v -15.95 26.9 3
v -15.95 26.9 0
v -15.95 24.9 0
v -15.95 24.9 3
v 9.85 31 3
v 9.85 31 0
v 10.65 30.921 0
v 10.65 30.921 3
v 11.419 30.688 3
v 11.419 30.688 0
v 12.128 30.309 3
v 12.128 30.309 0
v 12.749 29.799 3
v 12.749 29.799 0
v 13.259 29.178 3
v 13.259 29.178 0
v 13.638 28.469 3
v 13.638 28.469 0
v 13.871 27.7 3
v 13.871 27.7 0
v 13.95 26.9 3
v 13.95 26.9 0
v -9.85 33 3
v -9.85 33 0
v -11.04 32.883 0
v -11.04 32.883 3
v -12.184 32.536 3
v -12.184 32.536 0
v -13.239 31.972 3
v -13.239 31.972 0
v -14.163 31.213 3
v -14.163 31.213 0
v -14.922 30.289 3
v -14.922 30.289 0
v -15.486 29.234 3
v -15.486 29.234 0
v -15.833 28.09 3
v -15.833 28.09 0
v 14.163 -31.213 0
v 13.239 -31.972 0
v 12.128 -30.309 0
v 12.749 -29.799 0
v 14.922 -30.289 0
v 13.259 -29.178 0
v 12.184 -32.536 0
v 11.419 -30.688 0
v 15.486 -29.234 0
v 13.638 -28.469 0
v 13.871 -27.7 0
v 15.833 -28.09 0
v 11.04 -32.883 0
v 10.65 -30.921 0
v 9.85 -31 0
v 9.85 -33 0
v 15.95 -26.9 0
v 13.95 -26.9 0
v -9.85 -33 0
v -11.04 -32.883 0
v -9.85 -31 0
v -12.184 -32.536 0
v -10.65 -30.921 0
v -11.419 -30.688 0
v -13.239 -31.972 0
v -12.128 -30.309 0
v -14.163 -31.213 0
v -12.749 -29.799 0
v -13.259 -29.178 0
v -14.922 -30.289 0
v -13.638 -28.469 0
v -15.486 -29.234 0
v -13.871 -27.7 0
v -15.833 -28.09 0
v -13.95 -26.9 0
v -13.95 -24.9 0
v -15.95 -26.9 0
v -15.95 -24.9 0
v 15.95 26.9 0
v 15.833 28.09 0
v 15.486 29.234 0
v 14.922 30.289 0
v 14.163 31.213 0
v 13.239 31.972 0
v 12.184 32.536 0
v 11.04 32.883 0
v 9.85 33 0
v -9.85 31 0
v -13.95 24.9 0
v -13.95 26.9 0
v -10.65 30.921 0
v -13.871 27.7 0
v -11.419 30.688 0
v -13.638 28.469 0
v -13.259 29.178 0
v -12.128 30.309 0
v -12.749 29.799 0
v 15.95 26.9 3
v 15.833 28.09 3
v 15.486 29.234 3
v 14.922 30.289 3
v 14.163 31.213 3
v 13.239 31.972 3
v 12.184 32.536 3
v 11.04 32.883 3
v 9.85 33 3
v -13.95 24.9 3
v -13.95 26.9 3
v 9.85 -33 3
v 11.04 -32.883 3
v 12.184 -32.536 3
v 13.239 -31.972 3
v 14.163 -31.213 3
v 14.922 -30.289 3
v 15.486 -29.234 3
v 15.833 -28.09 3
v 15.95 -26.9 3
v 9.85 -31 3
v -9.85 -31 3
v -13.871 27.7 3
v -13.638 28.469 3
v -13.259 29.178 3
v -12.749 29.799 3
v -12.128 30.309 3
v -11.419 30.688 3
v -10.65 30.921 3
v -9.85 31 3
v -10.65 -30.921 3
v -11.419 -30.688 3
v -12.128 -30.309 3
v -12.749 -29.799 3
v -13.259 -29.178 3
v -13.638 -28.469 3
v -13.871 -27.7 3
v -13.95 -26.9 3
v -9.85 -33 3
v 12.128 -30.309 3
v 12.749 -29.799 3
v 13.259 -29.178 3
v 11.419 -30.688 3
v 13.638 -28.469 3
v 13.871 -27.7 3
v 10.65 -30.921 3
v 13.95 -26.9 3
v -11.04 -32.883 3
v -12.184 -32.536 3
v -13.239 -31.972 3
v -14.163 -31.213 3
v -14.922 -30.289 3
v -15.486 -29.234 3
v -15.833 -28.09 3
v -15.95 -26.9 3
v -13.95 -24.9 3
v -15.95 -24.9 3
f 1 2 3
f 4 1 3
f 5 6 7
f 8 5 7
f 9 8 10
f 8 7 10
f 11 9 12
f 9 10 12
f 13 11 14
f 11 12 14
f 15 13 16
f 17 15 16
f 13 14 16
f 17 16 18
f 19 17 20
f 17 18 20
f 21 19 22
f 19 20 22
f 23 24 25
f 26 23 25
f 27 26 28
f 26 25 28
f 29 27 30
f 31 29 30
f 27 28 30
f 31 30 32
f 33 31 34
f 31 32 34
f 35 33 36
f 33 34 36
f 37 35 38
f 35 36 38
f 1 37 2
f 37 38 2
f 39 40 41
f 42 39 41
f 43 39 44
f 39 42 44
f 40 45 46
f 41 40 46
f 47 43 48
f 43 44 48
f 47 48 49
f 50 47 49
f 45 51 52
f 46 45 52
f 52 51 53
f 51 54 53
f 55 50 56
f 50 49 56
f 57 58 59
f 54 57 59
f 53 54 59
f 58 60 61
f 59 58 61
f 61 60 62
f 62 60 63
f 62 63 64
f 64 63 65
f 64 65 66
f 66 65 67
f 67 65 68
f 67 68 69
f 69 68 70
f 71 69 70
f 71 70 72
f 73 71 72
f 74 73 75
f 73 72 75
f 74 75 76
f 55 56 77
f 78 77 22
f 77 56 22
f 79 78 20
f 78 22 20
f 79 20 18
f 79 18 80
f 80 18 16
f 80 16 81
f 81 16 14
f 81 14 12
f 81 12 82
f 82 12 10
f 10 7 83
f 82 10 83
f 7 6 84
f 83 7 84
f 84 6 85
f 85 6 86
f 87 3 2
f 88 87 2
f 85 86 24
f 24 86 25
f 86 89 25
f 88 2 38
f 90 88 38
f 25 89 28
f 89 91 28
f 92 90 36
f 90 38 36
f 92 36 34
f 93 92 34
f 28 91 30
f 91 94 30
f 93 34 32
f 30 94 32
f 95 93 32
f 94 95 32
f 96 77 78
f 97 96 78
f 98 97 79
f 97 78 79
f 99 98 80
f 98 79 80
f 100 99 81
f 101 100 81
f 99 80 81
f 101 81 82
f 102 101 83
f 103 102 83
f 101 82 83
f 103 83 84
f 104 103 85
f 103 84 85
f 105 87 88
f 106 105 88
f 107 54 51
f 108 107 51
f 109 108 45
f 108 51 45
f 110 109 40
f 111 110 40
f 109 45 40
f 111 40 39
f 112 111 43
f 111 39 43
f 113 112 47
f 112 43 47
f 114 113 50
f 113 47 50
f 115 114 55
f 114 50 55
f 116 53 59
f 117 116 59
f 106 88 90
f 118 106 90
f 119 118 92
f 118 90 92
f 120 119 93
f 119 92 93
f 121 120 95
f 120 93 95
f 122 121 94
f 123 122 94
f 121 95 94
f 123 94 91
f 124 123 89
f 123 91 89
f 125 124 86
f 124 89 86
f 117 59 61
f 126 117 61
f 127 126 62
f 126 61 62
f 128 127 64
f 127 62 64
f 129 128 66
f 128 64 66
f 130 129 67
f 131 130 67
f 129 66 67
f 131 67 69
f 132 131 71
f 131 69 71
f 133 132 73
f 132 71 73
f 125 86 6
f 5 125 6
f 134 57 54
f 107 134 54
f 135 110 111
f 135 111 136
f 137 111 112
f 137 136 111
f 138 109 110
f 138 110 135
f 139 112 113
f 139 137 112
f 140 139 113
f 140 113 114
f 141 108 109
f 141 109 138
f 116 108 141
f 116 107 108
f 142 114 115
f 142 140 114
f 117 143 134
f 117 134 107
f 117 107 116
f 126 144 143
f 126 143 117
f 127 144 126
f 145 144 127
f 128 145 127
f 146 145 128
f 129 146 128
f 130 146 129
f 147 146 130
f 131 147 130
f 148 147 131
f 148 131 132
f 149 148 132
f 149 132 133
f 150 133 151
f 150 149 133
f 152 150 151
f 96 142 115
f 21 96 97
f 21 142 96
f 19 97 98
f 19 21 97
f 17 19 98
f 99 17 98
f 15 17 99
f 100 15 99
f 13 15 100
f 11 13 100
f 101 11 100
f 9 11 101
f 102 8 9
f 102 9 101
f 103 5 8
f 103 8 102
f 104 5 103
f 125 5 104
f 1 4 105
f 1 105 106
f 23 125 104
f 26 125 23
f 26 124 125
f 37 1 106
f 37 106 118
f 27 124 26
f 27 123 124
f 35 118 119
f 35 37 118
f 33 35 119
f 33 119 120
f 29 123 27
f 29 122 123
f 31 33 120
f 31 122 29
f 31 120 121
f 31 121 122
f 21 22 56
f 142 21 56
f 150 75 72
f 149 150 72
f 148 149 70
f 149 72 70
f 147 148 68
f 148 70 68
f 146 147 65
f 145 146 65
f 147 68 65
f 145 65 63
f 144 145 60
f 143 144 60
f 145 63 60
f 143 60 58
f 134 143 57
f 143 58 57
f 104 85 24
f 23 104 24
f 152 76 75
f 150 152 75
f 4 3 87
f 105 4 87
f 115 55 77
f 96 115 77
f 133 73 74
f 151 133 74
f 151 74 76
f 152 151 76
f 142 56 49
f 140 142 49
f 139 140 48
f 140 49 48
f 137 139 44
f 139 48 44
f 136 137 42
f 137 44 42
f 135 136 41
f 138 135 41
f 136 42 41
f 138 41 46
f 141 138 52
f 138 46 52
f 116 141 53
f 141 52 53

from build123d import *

# Parameters (mm, degrees)
BOSS_EXTRUDE1_DEPTH = 3


with BuildPart() as part:
    # Sketch1 → Boss-Extrude1 (new body)
    with BuildSketch(Plane(origin=(0, 0, 0), x_dir=(0, 1, 0), z_dir=(0, 0, 1))):
        with BuildLine():
            Line((-26.9, 13.95), (-24.9, 13.95))
            Line((-24.9, 13.95), (-24.9, 15.95))
            Line((-24.9, 15.95), (-26.9, 15.95))
            ThreePointArc((-26.9, 15.95), (-31.213351365, 14.163351365), (-33, 9.85))
            Line((-33, 9.85), (-33, -9.85))
            ThreePointArc((-33, -9.85), (-31.213351365, -14.163351365), (-26.9, -15.95))
            Line((-26.9, -15.95), (26.9, -15.95))
            ThreePointArc((26.9, -15.95), (31.213351365, -14.163351365), (33, -9.85))
            Line((33, -9.85), (33, 9.85))
            ThreePointArc((33, 9.85), (31.213351365, 14.163351365), (26.9, 15.95))
            Line((26.9, 15.95), (24.9, 15.95))
            Line((24.9, 15.95), (24.9, 13.95))
            Line((24.9, 13.95), (26.9, 13.95))
            ThreePointArc((26.9, 13.95), (29.799137803, 12.749137803), (31, 9.85))
            Line((31, 9.85), (31, -9.85))
            ThreePointArc((31, -9.85), (29.799137803, -12.749137803), (26.9, -13.95))
            Line((26.9, -13.95), (-26.9, -13.95))
            ThreePointArc((-26.9, -13.95), (-29.799137803, -12.749137803), (-31, -9.85))
            Line((-31, -9.85), (-31, 9.85))
            ThreePointArc((-31, 9.85), (-29.799137803, 12.749137803), (-26.9, 13.95))
        make_face()
    extrude(amount=BOSS_EXTRUDE1_DEPTH)


solid = part.part
